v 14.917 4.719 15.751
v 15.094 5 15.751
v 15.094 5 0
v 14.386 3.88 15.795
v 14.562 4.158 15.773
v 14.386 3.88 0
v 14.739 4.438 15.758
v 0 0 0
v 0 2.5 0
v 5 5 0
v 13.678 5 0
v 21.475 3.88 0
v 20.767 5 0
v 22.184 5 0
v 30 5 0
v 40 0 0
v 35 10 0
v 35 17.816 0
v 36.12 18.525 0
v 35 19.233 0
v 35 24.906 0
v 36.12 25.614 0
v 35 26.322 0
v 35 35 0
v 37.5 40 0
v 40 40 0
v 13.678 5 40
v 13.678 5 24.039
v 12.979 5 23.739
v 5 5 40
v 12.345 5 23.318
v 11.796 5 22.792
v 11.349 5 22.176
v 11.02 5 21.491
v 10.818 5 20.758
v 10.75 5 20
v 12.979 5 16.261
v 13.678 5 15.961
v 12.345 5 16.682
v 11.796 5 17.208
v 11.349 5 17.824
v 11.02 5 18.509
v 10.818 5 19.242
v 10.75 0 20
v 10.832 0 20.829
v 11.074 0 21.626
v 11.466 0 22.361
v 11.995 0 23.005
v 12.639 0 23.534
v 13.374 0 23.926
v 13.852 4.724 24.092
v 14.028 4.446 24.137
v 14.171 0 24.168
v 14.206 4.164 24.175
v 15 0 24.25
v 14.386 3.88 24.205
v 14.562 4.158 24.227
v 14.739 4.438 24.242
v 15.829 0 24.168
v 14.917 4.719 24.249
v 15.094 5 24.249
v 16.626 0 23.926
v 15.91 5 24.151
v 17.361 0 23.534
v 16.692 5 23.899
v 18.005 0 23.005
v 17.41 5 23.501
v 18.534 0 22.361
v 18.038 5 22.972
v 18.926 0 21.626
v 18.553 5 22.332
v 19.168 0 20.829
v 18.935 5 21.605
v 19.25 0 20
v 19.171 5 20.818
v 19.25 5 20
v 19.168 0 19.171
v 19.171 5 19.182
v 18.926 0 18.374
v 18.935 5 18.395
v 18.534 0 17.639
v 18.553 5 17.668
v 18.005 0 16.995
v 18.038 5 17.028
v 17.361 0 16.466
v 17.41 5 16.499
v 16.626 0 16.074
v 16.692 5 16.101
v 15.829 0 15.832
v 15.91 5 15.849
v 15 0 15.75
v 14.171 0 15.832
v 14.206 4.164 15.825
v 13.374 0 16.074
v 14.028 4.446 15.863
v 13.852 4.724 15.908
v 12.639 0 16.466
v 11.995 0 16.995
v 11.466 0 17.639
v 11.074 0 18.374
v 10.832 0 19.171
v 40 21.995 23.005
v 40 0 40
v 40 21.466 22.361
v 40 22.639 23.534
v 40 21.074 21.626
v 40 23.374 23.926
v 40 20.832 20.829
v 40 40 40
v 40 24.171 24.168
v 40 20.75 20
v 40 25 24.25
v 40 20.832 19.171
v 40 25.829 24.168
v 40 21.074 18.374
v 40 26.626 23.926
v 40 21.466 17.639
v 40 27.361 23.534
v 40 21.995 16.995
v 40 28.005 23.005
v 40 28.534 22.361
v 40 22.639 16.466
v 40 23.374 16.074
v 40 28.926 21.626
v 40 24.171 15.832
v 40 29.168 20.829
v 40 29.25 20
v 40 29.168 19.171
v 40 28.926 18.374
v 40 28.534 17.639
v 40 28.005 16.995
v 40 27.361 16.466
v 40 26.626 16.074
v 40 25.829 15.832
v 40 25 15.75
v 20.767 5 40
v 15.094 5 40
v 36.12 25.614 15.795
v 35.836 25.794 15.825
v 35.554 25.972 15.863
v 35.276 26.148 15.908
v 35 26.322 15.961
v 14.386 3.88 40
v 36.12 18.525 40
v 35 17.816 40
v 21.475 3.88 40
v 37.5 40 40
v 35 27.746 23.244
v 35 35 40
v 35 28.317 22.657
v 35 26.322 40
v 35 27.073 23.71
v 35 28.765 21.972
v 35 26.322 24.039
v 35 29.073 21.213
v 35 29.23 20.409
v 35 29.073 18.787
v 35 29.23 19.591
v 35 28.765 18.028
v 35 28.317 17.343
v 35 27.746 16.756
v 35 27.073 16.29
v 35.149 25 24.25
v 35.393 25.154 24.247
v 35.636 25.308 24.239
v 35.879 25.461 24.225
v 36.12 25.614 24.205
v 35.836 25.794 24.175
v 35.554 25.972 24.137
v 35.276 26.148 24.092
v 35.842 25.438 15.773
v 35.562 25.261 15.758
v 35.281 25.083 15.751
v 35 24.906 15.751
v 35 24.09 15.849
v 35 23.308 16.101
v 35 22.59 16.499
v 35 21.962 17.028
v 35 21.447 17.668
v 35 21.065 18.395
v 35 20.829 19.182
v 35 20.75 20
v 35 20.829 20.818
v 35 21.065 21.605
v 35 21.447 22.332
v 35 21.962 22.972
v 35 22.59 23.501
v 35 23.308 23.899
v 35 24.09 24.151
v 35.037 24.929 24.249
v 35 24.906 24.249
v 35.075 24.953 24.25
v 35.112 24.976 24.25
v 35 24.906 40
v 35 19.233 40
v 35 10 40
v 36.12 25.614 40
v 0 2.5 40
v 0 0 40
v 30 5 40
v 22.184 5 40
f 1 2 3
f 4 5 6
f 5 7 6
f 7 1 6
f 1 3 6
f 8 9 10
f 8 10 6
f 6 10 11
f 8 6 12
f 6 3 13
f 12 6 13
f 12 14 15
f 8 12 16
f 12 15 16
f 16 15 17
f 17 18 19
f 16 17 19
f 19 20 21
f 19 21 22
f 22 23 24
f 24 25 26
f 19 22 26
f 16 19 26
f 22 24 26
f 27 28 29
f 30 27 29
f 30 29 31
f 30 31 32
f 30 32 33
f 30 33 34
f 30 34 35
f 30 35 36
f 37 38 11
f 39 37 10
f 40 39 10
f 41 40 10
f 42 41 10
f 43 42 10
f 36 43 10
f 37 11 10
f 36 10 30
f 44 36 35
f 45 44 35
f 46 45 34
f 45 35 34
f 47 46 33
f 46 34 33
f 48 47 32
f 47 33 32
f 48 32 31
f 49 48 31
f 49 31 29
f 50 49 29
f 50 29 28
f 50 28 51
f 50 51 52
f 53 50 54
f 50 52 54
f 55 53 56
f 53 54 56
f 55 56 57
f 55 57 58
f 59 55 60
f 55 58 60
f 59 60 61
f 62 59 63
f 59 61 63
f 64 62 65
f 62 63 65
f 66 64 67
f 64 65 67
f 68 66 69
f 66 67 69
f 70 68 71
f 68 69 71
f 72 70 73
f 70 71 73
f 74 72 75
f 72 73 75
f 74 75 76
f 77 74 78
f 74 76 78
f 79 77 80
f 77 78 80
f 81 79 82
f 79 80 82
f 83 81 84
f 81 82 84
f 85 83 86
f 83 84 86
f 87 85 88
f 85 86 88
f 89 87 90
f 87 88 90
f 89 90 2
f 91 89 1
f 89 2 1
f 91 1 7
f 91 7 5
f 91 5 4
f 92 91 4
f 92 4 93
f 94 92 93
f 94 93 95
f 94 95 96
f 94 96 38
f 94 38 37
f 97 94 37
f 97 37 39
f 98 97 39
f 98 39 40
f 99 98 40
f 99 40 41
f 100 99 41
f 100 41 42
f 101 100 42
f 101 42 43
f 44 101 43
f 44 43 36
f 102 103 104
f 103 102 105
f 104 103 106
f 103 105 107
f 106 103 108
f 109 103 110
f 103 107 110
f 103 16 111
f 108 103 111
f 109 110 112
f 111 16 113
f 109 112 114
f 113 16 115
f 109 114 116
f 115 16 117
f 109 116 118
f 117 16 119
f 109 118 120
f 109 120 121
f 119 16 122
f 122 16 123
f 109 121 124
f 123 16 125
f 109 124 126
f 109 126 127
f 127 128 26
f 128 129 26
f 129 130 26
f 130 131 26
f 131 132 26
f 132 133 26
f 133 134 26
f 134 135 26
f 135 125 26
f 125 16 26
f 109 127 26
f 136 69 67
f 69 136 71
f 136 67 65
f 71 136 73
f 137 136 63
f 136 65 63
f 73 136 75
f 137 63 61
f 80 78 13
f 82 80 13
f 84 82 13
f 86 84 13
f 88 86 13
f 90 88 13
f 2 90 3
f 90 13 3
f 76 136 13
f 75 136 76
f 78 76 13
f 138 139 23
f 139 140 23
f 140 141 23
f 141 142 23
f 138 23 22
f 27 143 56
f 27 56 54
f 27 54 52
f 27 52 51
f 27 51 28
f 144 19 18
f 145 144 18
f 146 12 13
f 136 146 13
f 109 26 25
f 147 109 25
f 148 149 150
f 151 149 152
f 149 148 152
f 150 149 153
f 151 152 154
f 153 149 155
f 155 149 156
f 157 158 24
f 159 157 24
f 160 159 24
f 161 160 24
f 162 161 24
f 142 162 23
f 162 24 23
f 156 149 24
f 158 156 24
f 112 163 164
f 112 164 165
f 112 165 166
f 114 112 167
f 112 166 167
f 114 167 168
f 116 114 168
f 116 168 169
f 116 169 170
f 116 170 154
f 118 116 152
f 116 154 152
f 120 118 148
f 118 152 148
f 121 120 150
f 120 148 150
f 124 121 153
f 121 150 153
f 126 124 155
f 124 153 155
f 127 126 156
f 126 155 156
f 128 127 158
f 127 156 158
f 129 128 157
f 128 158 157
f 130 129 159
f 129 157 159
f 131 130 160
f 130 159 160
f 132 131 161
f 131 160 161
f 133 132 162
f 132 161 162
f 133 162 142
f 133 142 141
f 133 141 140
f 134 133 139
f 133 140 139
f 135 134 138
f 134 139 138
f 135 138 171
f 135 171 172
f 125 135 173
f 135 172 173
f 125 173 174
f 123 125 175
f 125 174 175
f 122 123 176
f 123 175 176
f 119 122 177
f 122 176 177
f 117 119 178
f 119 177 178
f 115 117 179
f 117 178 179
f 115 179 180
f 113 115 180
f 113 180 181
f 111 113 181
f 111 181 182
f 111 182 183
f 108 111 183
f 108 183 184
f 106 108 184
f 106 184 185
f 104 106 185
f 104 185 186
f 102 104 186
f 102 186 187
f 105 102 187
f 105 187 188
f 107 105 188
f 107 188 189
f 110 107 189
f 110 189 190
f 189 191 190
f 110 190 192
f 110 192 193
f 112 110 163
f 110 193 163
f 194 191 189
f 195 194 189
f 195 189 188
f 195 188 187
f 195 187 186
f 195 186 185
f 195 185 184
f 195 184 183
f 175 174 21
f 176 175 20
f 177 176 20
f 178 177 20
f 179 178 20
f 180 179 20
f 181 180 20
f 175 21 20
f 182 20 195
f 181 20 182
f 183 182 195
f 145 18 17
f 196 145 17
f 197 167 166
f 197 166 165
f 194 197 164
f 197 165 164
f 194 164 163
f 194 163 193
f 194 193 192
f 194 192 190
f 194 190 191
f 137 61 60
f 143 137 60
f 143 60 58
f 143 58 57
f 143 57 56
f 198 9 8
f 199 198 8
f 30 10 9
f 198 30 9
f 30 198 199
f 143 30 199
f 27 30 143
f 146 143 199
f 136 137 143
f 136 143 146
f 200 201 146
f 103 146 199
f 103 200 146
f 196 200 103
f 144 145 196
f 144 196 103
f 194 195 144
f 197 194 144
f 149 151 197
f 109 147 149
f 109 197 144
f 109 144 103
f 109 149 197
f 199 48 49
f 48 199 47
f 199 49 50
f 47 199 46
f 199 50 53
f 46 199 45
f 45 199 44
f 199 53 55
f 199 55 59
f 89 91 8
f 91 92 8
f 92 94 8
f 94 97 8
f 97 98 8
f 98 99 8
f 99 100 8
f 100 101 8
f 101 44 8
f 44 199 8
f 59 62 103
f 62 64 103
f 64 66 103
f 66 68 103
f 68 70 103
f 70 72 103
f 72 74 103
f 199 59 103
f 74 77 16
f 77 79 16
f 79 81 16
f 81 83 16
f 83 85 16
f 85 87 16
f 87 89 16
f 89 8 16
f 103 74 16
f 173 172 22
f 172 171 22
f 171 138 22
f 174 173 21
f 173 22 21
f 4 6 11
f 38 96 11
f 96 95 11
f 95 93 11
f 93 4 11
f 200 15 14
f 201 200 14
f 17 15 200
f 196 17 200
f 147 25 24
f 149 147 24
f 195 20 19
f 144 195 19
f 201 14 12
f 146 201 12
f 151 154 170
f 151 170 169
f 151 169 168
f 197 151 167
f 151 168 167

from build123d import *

# Parameters (mm, degrees)
EXTRUDE_1_DEPTH     = 40
CHAMFER_1_SIZE      = 5
SKETCH_3_R          = 4.25
CUT_EXTRUDE_1_DEPTH = 67.520673478
SKETCH_4_R          = 4.25
CUT_EXTRUDE_2_DEPTH = 40


with BuildPart() as part:
    # 草图1 → 凸台-拉伸1 (new body)
    with BuildSketch(Plane.XY):
        Polygon((0, 0), (40, 0), (40, 40), (37.5, 40), (35, 35), (35, 26.322499125), (36.120266103, 25.614016347), (35, 24.905533569), (35, 19.233332915), (36.120266103, 18.524850137), (35, 17.816367359), (35, 5), (22.183632641, 5), (21.475149863, 3.879733897), (20.766667085, 5), (15.094466431, 5), (14.385983653, 3.879733897), (13.677500875, 5), (5, 5), (0, 2.5), align=None)
    extrude(amount=EXTRUDE_1_DEPTH)

    # 倒角1
    chamfer_1_edges = [part.edges().sort_by_distance(p)[0] for p in [
        (35, 5, 20),
    ]]
    chamfer(chamfer_1_edges, length=CHAMFER_1_SIZE)

    # 草图3 → 切除-拉伸1 (cut, through all)
    with BuildSketch(Plane(origin=(0, 5, 0), x_dir=(1, 0, 0), z_dir=(0, 1, 0))):
        with Locations(Location((15, -20, 0), (0, 0, 180))):
            Circle(SKETCH_3_R)
    extrude(amount=-CUT_EXTRUDE_1_DEPTH, mode=Mode.SUBTRACT)

    # 草图4 → 切除-拉伸2 (cut)
    with BuildSketch(Plane.ZY.offset(-35)):
        with Locations((20, 25)):
            Circle(SKETCH_4_R)
    extrude(amount=-CUT_EXTRUDE_2_DEPTH, mode=Mode.SUBTRACT)


solid = part.part
